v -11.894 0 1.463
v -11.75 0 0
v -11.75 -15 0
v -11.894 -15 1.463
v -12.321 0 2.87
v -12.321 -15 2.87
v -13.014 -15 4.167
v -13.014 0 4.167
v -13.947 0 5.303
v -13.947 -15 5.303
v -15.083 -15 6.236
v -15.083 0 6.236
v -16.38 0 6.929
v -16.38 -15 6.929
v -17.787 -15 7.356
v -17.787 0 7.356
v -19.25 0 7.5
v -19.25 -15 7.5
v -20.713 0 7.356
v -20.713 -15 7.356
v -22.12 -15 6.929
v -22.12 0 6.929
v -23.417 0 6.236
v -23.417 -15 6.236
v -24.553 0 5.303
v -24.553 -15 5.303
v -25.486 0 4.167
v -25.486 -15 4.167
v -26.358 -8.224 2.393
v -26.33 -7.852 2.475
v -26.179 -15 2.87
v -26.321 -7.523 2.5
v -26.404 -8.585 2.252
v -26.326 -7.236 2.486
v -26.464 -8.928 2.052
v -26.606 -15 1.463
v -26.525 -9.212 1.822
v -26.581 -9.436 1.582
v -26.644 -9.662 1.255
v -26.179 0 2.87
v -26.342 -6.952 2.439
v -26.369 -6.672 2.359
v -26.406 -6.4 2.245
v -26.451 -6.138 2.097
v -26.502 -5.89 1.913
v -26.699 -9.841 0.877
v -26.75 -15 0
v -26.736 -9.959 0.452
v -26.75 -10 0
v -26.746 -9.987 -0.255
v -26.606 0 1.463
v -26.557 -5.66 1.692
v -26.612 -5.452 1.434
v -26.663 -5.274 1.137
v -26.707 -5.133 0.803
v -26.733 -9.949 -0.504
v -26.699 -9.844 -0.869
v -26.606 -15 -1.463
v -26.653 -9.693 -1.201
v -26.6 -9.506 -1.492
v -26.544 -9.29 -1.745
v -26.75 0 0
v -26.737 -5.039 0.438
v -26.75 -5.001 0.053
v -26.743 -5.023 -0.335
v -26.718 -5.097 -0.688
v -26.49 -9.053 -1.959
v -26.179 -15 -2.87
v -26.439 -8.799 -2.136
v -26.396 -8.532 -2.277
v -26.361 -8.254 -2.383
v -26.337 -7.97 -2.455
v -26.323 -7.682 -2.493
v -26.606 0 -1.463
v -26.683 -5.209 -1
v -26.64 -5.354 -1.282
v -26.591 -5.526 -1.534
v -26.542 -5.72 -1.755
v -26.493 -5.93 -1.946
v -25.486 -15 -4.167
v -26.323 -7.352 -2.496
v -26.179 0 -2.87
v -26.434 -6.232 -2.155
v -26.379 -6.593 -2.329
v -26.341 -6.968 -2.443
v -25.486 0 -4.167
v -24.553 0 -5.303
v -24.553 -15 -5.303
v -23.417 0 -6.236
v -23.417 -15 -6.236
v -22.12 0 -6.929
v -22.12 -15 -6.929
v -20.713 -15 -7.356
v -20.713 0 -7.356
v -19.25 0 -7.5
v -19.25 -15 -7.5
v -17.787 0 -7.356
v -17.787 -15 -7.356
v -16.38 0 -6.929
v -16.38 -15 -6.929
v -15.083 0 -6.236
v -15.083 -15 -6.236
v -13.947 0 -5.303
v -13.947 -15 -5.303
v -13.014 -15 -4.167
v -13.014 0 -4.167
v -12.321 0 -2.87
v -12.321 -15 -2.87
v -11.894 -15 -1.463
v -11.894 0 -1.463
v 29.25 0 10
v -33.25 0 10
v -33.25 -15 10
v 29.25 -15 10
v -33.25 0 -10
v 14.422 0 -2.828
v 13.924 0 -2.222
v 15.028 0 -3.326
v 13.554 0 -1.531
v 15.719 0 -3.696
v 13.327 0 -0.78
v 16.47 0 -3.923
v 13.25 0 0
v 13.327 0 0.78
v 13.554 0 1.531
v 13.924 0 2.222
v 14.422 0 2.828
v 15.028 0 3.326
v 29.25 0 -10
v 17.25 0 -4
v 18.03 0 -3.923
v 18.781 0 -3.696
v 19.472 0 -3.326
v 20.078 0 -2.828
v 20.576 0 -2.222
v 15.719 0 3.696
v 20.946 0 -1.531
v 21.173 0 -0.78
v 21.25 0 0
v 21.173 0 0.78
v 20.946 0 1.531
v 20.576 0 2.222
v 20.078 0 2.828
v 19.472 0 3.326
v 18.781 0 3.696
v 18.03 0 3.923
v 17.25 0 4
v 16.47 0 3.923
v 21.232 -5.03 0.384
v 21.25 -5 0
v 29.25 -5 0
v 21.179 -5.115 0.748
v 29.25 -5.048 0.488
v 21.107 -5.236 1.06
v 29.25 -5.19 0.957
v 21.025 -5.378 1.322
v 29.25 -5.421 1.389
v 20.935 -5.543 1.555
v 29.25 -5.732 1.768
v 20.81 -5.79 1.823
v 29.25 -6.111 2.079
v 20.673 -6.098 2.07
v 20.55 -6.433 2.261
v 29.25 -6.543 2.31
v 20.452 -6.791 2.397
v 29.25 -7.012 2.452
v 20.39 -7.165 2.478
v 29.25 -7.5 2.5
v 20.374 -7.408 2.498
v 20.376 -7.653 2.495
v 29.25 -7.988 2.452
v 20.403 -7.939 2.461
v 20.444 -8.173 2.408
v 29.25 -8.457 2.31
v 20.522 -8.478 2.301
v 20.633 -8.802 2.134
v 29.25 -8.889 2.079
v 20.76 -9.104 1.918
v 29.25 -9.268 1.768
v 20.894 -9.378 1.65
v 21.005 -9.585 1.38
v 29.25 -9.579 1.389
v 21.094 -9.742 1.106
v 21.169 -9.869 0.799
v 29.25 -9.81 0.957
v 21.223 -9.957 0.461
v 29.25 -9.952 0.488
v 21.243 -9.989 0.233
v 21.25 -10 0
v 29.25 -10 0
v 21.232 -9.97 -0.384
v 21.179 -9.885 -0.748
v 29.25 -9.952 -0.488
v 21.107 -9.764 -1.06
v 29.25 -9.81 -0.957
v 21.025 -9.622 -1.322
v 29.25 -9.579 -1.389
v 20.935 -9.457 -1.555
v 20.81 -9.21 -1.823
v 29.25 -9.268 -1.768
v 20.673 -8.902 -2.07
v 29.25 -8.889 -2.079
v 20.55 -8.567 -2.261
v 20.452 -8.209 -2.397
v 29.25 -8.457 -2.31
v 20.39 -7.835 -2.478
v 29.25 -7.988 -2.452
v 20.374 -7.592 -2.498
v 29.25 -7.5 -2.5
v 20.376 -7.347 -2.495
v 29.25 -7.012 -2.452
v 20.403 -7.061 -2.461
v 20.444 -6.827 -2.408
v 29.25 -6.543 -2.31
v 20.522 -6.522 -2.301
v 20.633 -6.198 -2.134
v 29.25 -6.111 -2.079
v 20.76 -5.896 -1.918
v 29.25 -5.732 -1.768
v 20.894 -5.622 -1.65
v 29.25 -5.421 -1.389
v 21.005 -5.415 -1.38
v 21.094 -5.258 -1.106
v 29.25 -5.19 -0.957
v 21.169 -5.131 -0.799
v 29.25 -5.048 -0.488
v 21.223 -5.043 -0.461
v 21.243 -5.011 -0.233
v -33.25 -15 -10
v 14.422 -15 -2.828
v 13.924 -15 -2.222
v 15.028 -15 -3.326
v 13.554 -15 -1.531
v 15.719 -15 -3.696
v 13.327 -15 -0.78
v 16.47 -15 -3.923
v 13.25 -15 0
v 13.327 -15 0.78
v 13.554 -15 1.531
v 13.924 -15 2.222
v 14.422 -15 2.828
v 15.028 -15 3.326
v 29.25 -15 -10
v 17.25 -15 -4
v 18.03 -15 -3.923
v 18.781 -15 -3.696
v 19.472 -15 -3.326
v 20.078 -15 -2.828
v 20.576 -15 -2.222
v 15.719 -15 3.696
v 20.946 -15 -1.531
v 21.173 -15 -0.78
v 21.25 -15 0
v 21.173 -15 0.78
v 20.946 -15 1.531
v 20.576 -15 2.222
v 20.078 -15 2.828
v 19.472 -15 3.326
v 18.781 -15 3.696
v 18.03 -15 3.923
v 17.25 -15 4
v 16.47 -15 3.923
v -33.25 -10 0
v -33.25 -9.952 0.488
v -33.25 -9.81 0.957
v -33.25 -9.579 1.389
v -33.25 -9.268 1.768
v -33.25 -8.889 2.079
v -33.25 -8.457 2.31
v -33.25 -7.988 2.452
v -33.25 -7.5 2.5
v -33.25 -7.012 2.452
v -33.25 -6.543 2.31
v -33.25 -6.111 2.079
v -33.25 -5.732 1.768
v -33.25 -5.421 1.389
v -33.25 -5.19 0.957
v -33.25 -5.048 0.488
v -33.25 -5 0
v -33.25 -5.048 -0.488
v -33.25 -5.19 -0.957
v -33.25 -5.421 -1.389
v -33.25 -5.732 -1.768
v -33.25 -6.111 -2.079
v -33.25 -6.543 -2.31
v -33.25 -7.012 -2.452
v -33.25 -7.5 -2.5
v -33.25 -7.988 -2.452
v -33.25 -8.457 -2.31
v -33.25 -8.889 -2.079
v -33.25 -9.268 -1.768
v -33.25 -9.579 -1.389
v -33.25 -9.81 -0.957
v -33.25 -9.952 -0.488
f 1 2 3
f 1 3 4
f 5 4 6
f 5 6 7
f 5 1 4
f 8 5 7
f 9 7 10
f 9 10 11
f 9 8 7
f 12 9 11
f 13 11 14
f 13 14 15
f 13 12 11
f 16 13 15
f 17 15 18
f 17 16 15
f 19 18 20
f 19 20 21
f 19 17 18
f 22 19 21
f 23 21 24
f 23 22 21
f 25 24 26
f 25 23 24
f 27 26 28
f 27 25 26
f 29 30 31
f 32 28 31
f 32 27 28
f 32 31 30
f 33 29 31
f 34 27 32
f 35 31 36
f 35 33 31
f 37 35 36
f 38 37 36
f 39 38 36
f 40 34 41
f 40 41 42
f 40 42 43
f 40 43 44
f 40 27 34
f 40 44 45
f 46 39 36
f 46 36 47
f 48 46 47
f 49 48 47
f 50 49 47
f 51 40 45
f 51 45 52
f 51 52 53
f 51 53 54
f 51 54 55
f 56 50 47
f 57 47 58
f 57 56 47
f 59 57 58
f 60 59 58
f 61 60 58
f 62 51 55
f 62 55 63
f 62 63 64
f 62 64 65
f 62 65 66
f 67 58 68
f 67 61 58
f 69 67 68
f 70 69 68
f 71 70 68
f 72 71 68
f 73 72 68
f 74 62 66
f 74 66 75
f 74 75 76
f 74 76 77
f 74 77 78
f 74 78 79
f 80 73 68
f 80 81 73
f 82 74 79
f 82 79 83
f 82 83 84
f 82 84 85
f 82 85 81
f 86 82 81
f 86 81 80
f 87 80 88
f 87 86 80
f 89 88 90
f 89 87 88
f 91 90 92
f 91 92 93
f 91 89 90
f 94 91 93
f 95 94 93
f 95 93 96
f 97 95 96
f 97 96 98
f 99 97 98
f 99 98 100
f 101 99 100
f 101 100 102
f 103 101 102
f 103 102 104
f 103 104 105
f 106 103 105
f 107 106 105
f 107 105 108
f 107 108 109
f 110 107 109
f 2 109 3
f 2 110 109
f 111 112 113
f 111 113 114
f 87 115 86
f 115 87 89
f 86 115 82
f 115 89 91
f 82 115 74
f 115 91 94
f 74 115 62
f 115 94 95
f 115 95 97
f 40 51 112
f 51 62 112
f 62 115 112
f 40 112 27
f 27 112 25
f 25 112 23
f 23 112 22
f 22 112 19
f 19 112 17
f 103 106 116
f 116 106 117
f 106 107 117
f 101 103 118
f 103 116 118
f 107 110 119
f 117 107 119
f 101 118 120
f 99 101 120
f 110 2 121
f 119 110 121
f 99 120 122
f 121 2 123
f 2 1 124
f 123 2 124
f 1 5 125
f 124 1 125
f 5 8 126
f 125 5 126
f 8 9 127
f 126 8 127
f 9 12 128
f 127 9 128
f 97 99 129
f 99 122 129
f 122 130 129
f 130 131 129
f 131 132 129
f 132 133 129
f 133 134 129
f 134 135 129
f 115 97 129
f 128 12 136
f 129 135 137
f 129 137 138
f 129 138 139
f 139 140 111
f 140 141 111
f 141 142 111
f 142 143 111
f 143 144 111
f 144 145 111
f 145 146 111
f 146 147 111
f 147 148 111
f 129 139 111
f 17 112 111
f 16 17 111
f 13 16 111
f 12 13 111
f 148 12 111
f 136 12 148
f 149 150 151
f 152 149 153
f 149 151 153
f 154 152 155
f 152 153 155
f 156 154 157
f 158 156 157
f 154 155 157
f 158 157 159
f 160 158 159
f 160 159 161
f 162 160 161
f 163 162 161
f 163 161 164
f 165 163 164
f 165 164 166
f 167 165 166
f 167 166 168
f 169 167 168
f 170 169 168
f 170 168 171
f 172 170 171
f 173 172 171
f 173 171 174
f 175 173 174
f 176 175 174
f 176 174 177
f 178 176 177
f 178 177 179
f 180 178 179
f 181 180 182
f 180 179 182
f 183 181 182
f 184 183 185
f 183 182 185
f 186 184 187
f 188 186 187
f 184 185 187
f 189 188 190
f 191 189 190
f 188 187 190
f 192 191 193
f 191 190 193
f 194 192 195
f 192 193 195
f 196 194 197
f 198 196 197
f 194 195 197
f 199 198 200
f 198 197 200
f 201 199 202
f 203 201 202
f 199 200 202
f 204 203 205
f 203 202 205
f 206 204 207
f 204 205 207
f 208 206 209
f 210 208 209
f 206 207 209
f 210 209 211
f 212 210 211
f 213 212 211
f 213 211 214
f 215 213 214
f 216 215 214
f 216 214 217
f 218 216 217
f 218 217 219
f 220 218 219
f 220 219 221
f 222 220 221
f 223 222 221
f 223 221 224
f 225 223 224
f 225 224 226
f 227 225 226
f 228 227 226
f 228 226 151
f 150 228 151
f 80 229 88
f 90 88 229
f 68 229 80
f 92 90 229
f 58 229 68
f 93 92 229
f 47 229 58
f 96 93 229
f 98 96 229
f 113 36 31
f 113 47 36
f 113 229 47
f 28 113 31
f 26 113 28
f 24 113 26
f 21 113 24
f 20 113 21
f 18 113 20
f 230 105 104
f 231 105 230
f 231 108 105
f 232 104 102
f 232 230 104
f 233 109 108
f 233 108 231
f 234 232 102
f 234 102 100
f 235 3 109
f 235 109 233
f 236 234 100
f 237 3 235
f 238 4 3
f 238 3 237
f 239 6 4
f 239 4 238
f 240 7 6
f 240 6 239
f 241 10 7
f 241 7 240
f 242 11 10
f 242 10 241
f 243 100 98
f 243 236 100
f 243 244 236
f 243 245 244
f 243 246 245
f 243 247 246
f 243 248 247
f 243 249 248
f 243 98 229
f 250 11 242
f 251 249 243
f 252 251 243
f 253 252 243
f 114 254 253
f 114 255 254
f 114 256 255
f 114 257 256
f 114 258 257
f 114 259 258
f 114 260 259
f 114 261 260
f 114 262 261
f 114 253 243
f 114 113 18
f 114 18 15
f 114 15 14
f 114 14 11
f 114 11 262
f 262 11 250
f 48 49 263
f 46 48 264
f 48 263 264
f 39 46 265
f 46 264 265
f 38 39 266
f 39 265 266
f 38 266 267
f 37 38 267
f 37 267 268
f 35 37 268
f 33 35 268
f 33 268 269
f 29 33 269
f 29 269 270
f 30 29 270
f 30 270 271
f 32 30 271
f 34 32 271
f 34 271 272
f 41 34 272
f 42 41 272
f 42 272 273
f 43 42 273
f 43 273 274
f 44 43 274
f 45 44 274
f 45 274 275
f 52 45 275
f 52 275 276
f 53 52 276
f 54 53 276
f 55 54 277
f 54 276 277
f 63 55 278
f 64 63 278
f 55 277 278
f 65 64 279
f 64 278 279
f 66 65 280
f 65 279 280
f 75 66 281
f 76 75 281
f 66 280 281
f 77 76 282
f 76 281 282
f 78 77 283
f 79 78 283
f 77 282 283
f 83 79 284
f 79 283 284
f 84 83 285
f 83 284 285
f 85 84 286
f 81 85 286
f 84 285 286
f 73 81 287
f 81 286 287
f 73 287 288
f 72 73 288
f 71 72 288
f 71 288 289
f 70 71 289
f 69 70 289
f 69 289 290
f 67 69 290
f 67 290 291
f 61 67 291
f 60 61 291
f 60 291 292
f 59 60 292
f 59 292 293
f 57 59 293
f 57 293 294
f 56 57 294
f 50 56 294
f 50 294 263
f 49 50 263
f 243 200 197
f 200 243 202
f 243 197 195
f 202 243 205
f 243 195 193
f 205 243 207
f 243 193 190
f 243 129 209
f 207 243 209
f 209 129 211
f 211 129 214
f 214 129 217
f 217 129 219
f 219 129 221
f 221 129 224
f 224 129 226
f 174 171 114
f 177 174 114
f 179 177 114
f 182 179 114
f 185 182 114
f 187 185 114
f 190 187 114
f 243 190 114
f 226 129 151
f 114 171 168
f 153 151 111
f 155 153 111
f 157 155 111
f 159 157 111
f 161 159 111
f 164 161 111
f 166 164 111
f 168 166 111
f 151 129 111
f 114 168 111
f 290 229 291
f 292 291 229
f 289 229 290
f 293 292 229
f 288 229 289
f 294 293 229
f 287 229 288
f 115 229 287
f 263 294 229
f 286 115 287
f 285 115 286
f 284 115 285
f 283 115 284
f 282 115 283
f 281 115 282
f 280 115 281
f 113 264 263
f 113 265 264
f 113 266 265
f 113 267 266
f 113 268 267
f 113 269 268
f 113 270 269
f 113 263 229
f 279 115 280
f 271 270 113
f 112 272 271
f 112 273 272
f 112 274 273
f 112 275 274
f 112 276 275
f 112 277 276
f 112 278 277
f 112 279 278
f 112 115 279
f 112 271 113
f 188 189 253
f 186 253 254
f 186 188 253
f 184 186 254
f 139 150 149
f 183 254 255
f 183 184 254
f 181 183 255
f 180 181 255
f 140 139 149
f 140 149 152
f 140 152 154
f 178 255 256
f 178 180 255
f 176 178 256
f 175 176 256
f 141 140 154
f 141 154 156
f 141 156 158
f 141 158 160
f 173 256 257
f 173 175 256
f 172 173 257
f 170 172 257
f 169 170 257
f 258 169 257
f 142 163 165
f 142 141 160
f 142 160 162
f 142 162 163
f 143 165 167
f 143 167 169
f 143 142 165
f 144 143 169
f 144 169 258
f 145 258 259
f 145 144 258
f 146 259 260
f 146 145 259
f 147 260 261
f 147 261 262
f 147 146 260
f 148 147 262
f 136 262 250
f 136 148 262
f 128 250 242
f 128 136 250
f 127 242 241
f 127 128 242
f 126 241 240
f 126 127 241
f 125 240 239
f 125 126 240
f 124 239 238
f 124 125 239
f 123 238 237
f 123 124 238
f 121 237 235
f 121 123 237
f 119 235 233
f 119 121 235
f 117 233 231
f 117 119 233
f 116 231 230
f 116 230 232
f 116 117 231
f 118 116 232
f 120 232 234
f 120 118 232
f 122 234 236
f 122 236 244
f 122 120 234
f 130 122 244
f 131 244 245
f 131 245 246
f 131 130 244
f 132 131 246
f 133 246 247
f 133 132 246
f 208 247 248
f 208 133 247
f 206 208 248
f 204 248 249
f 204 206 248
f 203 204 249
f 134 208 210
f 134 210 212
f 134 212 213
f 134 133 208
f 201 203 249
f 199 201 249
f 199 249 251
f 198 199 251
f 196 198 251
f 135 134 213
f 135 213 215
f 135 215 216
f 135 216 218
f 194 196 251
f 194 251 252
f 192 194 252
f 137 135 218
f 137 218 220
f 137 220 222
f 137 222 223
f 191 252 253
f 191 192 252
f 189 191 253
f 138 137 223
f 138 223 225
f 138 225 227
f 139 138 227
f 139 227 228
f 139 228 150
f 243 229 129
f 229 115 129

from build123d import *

# Parameters (mm, degrees)
F0_W        = 62.5
F0_H        = 20
F0_R        = 7.5
F0_R_2      = 4
F1_DEPTH    = 7.5
F1_FACE_W   = 62.5
F1_FACE_H   = 20
F1_FACE_R   = 7.5
F1_FACE_R_2 = 4
F2_DEPTH    = 7.5
F3_R        = 2.5
F4_DEPTH    = 10
F5_R        = 2.5
F6_DEPTH    = 12


with BuildPart() as f1:
    # F0 (on Front) → F1 (new body)
    with BuildSketch(Plane.XZ):
        with Locations((-2, 0)):
            Rectangle(F0_W, F0_H)
        with Locations((-19.25, 0)):
            Circle(F0_R, mode=Mode.SUBTRACT)
        with Locations((17.25, 0)):
            Circle(F0_R_2, mode=Mode.SUBTRACT)
    extrude(amount=F1_DEPTH)

    # F1_face (on face) → F2 (join)
    with BuildSketch(Plane(origin=(0.033896, -7.5, 0), x_dir=(1, 0, 0), z_dir=(0, -1, 0))):
        with Locations((-2.033896, 0)):
            Rectangle(F1_FACE_W, F1_FACE_H)
        with Locations((-19.283896, 0)):
            Circle(F1_FACE_R, mode=Mode.SUBTRACT)
        with Locations((17.216104, 0)):
            Circle(F1_FACE_R_2, mode=Mode.SUBTRACT)
    extrude(amount=F2_DEPTH)

    # F3 (on face) → F4 (cut)
    with BuildSketch(Plane(origin=(-33.25, 0, 0), x_dir=(0, -1, 0), z_dir=(-1, 0, 0))):
        with Locations((7.5, 0)):
            Circle(F3_R)
    extrude(amount=-F4_DEPTH, mode=Mode.SUBTRACT)

    # F5 (on face) → F6 (cut)
    with BuildSketch(Plane.YZ.offset(29.25)):
        with Locations((-7.5, 0)):
            Circle(F5_R)
    extrude(amount=-F6_DEPTH, mode=Mode.SUBTRACT)


solid = f1.part
